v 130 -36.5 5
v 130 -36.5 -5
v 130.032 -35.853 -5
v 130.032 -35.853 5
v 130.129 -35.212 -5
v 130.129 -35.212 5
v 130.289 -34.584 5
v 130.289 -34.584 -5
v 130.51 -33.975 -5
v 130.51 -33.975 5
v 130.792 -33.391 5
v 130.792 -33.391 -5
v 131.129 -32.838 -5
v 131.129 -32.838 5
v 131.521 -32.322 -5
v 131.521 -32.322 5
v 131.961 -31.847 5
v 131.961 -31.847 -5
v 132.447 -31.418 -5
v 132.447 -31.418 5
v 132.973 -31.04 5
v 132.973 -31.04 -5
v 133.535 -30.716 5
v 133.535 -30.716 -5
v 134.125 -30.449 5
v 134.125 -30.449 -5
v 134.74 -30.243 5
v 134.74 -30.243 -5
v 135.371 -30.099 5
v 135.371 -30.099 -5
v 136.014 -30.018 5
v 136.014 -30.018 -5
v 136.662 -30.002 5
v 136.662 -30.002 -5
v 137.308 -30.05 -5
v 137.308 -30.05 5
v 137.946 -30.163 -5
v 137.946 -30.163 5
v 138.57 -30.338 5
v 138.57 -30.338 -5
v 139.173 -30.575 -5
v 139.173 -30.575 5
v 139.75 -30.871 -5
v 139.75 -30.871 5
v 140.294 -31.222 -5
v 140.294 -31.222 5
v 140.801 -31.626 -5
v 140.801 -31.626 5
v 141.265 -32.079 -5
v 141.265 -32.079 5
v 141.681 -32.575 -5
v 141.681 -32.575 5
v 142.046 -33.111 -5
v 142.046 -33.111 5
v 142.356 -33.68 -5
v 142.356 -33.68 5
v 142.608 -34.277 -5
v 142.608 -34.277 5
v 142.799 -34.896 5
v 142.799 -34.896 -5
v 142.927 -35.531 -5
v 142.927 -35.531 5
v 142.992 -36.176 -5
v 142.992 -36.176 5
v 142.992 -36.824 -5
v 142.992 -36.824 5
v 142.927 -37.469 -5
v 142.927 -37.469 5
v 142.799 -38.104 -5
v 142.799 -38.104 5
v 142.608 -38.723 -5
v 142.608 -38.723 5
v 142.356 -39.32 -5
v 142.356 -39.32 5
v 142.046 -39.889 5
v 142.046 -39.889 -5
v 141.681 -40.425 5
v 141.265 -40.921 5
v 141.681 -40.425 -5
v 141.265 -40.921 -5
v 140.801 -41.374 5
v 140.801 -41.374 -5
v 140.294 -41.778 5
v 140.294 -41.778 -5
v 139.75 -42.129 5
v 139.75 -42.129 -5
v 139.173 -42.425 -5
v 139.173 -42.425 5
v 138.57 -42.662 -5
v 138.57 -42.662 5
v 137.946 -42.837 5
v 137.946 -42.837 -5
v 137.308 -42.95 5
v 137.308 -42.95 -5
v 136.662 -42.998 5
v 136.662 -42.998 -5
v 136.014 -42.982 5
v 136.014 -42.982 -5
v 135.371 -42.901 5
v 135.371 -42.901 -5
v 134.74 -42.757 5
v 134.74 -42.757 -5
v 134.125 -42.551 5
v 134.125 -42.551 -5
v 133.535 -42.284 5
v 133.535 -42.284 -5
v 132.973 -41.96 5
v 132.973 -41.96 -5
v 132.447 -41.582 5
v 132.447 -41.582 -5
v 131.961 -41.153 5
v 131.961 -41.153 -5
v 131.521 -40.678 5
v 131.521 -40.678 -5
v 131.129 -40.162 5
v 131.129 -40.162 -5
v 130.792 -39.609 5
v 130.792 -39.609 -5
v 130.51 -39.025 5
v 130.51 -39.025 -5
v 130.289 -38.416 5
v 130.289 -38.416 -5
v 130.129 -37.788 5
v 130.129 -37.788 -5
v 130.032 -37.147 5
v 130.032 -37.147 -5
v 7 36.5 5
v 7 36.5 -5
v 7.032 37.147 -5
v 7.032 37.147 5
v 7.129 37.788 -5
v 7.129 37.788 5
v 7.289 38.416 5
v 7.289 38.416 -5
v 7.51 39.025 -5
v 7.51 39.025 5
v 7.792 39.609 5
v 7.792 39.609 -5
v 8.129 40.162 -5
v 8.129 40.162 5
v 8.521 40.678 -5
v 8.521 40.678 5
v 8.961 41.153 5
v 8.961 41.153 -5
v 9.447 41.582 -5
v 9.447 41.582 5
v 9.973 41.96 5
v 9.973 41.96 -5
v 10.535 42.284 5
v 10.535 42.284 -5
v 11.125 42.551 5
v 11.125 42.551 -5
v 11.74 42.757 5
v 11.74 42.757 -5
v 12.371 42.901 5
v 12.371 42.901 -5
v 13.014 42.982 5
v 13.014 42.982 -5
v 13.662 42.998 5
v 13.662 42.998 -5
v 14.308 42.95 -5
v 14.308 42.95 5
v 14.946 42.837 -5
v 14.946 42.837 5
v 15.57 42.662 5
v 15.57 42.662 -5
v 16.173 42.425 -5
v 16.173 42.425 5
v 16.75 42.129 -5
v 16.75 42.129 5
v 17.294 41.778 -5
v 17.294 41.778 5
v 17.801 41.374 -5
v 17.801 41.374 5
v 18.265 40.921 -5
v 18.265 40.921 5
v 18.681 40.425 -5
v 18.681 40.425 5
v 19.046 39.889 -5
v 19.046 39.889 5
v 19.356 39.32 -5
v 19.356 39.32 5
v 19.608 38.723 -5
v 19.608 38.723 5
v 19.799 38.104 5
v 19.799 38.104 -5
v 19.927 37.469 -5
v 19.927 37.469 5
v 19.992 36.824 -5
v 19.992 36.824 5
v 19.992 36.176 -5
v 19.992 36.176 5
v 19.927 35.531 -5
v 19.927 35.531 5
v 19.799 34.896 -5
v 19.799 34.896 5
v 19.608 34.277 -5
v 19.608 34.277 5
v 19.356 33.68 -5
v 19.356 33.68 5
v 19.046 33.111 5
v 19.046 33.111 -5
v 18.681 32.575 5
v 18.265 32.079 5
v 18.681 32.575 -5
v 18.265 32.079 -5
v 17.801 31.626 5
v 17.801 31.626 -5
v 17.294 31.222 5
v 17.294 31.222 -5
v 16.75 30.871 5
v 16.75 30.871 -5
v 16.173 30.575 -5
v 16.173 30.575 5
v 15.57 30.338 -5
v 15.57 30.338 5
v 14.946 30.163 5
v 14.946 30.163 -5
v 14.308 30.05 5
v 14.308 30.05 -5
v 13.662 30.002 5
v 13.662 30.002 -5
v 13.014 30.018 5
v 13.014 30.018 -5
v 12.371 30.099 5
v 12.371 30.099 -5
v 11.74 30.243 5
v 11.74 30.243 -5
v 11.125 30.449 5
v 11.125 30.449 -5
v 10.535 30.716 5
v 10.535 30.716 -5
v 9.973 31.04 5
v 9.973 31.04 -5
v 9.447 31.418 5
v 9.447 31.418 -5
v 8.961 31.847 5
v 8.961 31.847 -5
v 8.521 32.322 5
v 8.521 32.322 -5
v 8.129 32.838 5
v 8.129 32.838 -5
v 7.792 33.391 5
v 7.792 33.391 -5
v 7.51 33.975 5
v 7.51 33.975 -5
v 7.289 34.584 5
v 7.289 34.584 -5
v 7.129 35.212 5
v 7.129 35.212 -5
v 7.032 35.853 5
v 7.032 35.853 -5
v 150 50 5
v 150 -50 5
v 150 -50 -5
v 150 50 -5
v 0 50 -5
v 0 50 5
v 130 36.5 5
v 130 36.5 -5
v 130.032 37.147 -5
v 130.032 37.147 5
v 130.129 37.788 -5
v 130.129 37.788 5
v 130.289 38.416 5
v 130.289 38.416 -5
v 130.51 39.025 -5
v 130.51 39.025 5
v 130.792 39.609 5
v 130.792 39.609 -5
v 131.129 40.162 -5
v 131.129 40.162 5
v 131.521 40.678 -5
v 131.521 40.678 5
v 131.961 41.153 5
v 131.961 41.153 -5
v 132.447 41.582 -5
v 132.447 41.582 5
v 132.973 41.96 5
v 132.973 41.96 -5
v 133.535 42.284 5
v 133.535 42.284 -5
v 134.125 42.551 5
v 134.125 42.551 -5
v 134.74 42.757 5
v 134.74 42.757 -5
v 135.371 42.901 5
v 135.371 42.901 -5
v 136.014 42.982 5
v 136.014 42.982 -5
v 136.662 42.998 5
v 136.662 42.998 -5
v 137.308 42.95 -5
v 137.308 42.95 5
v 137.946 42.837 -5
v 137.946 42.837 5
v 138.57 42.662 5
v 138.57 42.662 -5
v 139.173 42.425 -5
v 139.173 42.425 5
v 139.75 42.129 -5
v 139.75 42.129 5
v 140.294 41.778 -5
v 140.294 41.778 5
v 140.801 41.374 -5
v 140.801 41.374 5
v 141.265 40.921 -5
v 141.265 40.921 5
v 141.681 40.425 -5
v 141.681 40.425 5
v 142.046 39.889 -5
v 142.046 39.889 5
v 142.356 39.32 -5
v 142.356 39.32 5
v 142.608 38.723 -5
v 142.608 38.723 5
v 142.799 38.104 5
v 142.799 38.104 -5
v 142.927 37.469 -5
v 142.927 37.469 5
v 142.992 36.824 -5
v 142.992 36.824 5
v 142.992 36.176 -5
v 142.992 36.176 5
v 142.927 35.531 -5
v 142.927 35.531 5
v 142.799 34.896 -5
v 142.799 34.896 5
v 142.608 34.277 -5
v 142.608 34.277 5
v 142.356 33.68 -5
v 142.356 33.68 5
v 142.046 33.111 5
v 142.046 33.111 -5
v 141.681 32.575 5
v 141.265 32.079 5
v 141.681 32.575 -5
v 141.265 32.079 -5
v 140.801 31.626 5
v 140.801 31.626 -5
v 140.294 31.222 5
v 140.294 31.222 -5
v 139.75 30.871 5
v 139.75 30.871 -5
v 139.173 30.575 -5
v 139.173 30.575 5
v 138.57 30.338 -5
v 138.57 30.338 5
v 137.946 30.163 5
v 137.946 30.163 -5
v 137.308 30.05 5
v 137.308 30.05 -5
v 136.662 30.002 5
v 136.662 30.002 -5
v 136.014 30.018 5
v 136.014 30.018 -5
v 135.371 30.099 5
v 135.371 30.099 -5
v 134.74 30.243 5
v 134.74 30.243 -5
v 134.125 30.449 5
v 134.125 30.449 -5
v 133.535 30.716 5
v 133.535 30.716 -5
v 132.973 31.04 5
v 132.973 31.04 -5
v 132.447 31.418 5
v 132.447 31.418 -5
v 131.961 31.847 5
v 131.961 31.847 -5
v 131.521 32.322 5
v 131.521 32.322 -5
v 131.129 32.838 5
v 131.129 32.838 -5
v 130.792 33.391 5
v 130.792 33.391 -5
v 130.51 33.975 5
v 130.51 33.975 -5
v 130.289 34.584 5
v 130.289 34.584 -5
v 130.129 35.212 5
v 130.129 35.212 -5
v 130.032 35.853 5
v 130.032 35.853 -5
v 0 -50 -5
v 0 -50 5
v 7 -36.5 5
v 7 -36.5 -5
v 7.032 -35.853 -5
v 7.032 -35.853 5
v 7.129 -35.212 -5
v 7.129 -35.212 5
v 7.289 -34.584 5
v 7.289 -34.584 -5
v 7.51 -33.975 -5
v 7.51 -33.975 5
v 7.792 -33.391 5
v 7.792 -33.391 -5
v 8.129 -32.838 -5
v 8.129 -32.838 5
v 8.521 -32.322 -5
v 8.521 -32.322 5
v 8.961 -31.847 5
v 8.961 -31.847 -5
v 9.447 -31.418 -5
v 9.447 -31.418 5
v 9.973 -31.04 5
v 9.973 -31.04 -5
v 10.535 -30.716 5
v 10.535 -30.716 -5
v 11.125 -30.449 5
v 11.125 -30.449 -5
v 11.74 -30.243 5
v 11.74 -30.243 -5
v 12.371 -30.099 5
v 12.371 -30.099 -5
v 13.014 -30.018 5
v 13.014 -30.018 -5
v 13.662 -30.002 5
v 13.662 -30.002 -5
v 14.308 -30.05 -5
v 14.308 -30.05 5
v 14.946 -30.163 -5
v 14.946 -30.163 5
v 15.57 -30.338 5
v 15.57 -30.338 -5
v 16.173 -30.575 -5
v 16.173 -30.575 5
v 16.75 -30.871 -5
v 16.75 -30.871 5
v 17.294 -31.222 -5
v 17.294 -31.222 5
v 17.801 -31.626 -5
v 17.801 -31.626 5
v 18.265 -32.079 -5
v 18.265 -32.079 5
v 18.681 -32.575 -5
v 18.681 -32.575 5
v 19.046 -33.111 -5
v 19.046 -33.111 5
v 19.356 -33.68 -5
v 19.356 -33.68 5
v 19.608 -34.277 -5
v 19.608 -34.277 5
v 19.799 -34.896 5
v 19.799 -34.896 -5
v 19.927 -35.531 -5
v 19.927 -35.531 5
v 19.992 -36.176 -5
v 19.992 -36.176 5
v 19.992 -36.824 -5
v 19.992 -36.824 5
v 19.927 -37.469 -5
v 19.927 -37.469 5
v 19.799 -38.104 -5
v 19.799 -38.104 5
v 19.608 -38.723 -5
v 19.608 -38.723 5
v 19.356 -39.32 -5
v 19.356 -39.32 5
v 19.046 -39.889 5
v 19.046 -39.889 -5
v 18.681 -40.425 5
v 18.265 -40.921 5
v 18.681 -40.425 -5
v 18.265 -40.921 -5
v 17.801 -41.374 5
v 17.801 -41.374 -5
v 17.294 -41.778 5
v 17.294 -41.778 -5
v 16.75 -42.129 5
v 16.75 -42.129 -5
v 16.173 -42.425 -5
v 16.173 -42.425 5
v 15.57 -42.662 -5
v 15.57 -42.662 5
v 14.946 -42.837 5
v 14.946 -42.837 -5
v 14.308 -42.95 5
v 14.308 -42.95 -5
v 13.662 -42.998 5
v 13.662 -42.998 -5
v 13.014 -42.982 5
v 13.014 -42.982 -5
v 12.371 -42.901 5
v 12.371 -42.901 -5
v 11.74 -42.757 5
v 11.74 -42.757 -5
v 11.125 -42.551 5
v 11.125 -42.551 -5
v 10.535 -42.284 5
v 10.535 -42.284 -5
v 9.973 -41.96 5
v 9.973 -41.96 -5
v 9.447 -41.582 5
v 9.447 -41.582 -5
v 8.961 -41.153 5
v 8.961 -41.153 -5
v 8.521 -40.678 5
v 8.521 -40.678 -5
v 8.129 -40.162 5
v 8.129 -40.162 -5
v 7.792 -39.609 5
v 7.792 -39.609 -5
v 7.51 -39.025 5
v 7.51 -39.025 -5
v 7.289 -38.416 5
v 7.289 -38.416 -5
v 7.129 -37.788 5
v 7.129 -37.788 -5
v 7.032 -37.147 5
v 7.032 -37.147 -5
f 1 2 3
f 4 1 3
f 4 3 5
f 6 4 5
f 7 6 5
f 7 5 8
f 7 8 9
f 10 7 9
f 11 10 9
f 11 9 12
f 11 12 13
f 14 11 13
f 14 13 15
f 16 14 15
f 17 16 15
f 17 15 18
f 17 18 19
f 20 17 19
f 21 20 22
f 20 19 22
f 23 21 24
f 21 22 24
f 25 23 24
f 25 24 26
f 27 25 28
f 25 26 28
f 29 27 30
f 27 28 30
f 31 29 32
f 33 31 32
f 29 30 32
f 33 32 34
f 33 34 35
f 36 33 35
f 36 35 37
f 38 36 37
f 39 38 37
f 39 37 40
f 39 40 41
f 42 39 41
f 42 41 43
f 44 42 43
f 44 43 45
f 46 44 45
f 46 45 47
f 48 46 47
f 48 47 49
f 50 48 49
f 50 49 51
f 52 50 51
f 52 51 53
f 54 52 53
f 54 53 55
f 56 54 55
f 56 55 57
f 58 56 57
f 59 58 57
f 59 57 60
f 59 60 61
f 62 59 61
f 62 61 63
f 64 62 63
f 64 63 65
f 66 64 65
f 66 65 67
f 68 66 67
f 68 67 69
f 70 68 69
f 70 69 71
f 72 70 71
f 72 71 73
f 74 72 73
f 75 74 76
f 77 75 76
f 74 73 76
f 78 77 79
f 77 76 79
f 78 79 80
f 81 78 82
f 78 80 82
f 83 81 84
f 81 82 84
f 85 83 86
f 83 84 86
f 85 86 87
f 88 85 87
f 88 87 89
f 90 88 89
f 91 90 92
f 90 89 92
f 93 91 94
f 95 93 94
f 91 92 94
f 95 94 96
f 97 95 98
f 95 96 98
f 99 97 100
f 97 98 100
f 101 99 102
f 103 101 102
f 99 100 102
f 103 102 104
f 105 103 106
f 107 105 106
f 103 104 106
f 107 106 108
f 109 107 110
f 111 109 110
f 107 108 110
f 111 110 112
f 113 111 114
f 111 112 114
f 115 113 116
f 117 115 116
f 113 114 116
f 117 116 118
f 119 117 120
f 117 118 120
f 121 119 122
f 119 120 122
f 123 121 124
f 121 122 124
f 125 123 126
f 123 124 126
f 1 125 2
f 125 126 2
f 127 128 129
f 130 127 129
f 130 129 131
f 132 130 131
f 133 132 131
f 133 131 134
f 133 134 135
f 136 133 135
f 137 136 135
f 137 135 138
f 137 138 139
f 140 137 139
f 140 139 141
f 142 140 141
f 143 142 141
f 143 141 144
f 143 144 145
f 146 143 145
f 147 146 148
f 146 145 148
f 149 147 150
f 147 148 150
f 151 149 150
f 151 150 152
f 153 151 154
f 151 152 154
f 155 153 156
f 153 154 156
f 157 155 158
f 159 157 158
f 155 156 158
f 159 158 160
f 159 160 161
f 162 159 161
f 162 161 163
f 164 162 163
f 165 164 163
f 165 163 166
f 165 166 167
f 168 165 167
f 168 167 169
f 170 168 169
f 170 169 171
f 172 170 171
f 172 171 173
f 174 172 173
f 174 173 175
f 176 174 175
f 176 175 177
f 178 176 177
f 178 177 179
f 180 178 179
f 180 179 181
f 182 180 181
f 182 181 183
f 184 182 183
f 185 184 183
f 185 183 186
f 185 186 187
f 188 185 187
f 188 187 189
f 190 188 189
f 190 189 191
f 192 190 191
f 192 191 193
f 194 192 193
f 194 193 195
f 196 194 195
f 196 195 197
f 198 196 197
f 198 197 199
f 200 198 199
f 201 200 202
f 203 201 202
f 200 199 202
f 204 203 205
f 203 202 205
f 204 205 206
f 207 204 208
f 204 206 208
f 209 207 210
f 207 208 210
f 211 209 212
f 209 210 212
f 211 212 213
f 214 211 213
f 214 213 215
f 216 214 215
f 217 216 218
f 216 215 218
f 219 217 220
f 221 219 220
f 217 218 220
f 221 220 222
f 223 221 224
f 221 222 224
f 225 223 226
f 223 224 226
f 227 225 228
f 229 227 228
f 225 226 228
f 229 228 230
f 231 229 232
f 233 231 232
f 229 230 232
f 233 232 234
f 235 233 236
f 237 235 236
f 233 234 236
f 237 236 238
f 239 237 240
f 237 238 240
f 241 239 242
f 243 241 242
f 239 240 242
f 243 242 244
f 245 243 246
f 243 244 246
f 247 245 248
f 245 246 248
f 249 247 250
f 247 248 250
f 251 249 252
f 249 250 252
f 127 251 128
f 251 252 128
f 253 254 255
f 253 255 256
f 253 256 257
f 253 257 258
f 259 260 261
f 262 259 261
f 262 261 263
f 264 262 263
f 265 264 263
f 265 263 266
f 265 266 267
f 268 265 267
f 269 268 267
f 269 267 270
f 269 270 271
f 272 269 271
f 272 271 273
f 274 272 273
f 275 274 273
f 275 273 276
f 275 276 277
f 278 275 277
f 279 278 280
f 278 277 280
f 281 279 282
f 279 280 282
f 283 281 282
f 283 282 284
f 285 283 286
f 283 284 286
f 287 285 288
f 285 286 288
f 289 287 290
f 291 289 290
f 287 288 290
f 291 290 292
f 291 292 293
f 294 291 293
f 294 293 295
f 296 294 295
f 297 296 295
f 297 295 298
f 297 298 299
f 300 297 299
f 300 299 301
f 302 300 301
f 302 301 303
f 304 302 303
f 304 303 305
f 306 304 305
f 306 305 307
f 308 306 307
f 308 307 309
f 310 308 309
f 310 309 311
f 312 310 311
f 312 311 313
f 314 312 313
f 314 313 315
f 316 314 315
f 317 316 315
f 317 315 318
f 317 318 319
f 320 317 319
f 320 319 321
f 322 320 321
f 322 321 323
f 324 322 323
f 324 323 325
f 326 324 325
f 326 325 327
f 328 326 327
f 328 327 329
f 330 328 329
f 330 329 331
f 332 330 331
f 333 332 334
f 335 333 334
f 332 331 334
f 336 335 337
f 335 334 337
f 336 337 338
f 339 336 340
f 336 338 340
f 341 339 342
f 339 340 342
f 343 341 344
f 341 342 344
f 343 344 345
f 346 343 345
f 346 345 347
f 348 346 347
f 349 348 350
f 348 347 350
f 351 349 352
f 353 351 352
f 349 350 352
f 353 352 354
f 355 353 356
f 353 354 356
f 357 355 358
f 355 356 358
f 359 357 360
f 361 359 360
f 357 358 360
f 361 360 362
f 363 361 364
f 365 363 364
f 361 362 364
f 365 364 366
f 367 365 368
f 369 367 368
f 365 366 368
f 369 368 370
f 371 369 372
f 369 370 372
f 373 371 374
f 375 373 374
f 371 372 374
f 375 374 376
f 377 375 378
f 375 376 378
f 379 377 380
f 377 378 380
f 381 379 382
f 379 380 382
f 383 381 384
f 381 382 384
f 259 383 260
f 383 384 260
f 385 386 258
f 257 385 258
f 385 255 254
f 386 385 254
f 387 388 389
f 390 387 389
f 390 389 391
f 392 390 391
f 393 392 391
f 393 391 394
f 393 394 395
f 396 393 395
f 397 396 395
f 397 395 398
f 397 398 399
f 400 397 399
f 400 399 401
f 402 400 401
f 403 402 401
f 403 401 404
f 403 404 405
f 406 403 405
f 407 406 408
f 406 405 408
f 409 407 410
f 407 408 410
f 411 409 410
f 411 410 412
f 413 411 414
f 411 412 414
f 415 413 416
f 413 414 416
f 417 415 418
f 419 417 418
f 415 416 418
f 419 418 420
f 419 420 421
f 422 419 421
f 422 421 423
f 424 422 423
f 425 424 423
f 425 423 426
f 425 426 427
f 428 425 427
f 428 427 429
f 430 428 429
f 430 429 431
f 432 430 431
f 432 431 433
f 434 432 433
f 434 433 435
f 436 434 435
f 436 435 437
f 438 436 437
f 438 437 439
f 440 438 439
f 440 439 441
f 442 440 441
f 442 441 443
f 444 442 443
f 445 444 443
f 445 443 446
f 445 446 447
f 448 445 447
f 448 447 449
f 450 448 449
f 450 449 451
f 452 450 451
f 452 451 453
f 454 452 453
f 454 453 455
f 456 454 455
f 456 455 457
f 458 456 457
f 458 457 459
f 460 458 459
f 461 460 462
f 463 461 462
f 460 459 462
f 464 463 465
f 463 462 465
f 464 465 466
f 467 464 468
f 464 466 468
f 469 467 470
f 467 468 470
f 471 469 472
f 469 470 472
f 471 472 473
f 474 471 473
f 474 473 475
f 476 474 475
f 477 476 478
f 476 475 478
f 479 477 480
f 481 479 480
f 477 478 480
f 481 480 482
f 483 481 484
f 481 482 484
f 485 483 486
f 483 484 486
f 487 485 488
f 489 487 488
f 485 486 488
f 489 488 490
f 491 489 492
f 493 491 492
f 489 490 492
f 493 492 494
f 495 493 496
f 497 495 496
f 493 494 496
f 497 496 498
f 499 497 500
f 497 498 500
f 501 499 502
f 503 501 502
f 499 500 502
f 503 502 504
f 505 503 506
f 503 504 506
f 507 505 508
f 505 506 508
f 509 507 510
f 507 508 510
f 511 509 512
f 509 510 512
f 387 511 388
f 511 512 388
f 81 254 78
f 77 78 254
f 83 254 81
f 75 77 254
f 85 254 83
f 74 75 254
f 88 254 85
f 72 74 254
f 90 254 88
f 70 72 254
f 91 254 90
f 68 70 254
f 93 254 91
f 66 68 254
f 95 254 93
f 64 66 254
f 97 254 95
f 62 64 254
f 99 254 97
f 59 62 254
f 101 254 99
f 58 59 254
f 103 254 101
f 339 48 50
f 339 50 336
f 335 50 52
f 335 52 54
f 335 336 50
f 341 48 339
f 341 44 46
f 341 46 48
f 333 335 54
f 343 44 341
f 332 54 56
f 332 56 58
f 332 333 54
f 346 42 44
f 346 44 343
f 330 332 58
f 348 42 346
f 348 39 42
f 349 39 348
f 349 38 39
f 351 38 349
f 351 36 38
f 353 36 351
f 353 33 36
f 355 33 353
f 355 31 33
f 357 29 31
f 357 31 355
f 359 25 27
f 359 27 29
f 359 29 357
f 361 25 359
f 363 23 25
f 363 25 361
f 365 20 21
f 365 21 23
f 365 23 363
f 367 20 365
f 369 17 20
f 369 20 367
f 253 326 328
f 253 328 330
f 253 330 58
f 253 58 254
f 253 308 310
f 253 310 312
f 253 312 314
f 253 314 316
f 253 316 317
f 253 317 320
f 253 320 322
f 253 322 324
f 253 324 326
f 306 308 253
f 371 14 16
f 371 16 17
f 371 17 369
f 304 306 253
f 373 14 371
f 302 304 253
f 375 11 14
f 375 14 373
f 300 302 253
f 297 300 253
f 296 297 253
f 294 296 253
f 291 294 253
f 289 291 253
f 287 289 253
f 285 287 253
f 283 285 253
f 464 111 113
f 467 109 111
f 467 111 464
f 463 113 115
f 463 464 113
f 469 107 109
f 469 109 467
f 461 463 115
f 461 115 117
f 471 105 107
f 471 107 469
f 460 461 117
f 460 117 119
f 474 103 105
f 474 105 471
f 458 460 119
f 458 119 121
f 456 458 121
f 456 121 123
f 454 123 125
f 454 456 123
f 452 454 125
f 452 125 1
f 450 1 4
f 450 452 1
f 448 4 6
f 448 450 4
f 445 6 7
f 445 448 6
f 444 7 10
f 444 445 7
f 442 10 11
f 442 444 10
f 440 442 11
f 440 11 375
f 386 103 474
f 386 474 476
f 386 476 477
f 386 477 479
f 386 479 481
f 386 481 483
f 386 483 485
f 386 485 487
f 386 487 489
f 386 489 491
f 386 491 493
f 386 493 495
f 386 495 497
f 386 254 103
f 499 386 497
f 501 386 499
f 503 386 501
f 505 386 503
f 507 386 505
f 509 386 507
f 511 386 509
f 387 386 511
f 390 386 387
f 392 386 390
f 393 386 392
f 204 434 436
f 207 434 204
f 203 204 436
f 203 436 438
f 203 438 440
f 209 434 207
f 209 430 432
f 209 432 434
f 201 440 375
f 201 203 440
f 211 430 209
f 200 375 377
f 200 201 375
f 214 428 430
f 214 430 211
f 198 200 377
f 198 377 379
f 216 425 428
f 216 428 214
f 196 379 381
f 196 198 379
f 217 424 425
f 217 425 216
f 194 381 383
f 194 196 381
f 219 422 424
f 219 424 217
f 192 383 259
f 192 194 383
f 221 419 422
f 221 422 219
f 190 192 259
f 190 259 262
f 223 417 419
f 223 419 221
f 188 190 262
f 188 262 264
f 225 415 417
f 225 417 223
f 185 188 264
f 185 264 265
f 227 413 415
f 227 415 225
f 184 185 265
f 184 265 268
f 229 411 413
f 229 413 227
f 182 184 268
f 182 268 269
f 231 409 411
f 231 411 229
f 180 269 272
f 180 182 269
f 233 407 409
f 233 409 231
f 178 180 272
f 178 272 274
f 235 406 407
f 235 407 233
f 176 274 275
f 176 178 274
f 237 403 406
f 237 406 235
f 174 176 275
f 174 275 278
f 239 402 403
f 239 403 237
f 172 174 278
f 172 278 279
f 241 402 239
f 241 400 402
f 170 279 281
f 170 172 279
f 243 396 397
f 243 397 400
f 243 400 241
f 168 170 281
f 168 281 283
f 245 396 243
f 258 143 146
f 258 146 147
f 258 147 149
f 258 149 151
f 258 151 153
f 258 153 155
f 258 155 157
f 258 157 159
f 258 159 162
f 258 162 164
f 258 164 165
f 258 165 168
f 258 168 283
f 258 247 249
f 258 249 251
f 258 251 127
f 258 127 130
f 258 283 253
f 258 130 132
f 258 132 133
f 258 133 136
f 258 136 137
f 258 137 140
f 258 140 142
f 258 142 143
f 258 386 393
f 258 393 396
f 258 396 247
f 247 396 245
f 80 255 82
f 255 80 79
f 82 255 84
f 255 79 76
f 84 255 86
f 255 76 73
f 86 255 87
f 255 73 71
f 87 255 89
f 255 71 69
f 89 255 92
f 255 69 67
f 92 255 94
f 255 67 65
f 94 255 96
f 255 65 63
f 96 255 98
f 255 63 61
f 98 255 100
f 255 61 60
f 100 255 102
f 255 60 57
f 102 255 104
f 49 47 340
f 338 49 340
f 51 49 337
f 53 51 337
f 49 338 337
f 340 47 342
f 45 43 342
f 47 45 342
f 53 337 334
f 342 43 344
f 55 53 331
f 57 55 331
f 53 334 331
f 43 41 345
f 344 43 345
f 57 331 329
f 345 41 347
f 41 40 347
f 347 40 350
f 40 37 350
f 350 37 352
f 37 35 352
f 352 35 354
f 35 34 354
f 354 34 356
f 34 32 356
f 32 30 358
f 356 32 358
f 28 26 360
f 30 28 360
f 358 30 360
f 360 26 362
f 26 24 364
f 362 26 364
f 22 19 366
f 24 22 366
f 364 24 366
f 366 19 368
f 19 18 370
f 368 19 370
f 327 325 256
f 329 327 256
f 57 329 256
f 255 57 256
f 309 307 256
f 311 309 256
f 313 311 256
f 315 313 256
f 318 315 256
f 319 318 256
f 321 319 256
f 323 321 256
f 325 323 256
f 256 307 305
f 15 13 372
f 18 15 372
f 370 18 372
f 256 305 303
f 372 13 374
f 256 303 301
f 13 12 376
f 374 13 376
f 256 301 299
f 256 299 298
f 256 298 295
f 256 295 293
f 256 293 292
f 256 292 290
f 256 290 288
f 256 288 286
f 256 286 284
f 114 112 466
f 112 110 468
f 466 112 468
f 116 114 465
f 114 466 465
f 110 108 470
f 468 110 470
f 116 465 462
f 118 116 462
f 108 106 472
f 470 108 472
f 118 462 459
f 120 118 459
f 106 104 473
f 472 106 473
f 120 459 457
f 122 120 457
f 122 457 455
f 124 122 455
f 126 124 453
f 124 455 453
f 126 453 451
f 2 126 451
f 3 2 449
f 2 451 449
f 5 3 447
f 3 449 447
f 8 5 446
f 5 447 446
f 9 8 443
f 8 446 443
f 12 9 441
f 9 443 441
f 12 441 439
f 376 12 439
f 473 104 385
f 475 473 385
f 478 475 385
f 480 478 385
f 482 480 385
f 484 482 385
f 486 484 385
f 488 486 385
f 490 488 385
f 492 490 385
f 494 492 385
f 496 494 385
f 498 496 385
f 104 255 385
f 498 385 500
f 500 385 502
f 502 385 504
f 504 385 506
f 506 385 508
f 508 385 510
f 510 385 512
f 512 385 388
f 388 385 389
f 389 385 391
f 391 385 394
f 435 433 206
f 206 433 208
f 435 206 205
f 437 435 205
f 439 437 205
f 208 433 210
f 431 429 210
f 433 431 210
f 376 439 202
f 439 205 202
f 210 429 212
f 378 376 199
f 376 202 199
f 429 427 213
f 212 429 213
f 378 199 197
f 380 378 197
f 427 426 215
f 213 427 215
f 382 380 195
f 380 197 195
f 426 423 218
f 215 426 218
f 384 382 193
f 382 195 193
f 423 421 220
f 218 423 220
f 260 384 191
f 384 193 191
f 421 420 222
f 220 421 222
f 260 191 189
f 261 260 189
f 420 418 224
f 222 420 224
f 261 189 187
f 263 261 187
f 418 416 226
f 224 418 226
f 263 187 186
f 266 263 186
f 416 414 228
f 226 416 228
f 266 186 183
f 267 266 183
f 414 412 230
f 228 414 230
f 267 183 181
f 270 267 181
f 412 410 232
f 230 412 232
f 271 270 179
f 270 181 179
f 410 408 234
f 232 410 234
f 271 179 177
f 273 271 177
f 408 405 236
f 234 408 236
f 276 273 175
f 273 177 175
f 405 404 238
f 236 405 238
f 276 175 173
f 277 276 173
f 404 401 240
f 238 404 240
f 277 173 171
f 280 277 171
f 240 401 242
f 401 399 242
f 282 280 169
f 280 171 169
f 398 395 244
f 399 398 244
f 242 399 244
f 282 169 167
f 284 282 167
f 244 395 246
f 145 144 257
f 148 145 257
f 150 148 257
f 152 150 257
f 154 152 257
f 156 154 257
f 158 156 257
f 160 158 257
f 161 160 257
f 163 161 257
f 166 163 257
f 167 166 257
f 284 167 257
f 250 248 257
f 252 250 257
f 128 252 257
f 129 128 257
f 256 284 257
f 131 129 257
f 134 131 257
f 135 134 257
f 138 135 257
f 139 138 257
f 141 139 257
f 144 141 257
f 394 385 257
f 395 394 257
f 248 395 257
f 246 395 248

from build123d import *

# Parameters (mm, degrees)
PLAT_W                      = 100
PLAT_H                      = 10
EL_MENT_M_CANO_SOUD_1_DEPTH = 150
D_GAGEMENT_M121_D           = 13


with BuildPart() as part:
    # plat → Elément mécano-soudé1 (new body)
    with BuildSketch(Plane.YZ):
        Rectangle(PLAT_W, PLAT_H)
    extrude(amount=EL_MENT_M_CANO_SOUD_1_DEPTH)

    # Dégagement M121 (through all)
    with Locations(Plane.XY.offset(5)):
        with Locations((13.5, 36.5), (136.5, 36.5), (136.5, -36.5), (13.5, -36.5)):
            Hole(D_GAGEMENT_M121_D / 2)


solid = part.part
